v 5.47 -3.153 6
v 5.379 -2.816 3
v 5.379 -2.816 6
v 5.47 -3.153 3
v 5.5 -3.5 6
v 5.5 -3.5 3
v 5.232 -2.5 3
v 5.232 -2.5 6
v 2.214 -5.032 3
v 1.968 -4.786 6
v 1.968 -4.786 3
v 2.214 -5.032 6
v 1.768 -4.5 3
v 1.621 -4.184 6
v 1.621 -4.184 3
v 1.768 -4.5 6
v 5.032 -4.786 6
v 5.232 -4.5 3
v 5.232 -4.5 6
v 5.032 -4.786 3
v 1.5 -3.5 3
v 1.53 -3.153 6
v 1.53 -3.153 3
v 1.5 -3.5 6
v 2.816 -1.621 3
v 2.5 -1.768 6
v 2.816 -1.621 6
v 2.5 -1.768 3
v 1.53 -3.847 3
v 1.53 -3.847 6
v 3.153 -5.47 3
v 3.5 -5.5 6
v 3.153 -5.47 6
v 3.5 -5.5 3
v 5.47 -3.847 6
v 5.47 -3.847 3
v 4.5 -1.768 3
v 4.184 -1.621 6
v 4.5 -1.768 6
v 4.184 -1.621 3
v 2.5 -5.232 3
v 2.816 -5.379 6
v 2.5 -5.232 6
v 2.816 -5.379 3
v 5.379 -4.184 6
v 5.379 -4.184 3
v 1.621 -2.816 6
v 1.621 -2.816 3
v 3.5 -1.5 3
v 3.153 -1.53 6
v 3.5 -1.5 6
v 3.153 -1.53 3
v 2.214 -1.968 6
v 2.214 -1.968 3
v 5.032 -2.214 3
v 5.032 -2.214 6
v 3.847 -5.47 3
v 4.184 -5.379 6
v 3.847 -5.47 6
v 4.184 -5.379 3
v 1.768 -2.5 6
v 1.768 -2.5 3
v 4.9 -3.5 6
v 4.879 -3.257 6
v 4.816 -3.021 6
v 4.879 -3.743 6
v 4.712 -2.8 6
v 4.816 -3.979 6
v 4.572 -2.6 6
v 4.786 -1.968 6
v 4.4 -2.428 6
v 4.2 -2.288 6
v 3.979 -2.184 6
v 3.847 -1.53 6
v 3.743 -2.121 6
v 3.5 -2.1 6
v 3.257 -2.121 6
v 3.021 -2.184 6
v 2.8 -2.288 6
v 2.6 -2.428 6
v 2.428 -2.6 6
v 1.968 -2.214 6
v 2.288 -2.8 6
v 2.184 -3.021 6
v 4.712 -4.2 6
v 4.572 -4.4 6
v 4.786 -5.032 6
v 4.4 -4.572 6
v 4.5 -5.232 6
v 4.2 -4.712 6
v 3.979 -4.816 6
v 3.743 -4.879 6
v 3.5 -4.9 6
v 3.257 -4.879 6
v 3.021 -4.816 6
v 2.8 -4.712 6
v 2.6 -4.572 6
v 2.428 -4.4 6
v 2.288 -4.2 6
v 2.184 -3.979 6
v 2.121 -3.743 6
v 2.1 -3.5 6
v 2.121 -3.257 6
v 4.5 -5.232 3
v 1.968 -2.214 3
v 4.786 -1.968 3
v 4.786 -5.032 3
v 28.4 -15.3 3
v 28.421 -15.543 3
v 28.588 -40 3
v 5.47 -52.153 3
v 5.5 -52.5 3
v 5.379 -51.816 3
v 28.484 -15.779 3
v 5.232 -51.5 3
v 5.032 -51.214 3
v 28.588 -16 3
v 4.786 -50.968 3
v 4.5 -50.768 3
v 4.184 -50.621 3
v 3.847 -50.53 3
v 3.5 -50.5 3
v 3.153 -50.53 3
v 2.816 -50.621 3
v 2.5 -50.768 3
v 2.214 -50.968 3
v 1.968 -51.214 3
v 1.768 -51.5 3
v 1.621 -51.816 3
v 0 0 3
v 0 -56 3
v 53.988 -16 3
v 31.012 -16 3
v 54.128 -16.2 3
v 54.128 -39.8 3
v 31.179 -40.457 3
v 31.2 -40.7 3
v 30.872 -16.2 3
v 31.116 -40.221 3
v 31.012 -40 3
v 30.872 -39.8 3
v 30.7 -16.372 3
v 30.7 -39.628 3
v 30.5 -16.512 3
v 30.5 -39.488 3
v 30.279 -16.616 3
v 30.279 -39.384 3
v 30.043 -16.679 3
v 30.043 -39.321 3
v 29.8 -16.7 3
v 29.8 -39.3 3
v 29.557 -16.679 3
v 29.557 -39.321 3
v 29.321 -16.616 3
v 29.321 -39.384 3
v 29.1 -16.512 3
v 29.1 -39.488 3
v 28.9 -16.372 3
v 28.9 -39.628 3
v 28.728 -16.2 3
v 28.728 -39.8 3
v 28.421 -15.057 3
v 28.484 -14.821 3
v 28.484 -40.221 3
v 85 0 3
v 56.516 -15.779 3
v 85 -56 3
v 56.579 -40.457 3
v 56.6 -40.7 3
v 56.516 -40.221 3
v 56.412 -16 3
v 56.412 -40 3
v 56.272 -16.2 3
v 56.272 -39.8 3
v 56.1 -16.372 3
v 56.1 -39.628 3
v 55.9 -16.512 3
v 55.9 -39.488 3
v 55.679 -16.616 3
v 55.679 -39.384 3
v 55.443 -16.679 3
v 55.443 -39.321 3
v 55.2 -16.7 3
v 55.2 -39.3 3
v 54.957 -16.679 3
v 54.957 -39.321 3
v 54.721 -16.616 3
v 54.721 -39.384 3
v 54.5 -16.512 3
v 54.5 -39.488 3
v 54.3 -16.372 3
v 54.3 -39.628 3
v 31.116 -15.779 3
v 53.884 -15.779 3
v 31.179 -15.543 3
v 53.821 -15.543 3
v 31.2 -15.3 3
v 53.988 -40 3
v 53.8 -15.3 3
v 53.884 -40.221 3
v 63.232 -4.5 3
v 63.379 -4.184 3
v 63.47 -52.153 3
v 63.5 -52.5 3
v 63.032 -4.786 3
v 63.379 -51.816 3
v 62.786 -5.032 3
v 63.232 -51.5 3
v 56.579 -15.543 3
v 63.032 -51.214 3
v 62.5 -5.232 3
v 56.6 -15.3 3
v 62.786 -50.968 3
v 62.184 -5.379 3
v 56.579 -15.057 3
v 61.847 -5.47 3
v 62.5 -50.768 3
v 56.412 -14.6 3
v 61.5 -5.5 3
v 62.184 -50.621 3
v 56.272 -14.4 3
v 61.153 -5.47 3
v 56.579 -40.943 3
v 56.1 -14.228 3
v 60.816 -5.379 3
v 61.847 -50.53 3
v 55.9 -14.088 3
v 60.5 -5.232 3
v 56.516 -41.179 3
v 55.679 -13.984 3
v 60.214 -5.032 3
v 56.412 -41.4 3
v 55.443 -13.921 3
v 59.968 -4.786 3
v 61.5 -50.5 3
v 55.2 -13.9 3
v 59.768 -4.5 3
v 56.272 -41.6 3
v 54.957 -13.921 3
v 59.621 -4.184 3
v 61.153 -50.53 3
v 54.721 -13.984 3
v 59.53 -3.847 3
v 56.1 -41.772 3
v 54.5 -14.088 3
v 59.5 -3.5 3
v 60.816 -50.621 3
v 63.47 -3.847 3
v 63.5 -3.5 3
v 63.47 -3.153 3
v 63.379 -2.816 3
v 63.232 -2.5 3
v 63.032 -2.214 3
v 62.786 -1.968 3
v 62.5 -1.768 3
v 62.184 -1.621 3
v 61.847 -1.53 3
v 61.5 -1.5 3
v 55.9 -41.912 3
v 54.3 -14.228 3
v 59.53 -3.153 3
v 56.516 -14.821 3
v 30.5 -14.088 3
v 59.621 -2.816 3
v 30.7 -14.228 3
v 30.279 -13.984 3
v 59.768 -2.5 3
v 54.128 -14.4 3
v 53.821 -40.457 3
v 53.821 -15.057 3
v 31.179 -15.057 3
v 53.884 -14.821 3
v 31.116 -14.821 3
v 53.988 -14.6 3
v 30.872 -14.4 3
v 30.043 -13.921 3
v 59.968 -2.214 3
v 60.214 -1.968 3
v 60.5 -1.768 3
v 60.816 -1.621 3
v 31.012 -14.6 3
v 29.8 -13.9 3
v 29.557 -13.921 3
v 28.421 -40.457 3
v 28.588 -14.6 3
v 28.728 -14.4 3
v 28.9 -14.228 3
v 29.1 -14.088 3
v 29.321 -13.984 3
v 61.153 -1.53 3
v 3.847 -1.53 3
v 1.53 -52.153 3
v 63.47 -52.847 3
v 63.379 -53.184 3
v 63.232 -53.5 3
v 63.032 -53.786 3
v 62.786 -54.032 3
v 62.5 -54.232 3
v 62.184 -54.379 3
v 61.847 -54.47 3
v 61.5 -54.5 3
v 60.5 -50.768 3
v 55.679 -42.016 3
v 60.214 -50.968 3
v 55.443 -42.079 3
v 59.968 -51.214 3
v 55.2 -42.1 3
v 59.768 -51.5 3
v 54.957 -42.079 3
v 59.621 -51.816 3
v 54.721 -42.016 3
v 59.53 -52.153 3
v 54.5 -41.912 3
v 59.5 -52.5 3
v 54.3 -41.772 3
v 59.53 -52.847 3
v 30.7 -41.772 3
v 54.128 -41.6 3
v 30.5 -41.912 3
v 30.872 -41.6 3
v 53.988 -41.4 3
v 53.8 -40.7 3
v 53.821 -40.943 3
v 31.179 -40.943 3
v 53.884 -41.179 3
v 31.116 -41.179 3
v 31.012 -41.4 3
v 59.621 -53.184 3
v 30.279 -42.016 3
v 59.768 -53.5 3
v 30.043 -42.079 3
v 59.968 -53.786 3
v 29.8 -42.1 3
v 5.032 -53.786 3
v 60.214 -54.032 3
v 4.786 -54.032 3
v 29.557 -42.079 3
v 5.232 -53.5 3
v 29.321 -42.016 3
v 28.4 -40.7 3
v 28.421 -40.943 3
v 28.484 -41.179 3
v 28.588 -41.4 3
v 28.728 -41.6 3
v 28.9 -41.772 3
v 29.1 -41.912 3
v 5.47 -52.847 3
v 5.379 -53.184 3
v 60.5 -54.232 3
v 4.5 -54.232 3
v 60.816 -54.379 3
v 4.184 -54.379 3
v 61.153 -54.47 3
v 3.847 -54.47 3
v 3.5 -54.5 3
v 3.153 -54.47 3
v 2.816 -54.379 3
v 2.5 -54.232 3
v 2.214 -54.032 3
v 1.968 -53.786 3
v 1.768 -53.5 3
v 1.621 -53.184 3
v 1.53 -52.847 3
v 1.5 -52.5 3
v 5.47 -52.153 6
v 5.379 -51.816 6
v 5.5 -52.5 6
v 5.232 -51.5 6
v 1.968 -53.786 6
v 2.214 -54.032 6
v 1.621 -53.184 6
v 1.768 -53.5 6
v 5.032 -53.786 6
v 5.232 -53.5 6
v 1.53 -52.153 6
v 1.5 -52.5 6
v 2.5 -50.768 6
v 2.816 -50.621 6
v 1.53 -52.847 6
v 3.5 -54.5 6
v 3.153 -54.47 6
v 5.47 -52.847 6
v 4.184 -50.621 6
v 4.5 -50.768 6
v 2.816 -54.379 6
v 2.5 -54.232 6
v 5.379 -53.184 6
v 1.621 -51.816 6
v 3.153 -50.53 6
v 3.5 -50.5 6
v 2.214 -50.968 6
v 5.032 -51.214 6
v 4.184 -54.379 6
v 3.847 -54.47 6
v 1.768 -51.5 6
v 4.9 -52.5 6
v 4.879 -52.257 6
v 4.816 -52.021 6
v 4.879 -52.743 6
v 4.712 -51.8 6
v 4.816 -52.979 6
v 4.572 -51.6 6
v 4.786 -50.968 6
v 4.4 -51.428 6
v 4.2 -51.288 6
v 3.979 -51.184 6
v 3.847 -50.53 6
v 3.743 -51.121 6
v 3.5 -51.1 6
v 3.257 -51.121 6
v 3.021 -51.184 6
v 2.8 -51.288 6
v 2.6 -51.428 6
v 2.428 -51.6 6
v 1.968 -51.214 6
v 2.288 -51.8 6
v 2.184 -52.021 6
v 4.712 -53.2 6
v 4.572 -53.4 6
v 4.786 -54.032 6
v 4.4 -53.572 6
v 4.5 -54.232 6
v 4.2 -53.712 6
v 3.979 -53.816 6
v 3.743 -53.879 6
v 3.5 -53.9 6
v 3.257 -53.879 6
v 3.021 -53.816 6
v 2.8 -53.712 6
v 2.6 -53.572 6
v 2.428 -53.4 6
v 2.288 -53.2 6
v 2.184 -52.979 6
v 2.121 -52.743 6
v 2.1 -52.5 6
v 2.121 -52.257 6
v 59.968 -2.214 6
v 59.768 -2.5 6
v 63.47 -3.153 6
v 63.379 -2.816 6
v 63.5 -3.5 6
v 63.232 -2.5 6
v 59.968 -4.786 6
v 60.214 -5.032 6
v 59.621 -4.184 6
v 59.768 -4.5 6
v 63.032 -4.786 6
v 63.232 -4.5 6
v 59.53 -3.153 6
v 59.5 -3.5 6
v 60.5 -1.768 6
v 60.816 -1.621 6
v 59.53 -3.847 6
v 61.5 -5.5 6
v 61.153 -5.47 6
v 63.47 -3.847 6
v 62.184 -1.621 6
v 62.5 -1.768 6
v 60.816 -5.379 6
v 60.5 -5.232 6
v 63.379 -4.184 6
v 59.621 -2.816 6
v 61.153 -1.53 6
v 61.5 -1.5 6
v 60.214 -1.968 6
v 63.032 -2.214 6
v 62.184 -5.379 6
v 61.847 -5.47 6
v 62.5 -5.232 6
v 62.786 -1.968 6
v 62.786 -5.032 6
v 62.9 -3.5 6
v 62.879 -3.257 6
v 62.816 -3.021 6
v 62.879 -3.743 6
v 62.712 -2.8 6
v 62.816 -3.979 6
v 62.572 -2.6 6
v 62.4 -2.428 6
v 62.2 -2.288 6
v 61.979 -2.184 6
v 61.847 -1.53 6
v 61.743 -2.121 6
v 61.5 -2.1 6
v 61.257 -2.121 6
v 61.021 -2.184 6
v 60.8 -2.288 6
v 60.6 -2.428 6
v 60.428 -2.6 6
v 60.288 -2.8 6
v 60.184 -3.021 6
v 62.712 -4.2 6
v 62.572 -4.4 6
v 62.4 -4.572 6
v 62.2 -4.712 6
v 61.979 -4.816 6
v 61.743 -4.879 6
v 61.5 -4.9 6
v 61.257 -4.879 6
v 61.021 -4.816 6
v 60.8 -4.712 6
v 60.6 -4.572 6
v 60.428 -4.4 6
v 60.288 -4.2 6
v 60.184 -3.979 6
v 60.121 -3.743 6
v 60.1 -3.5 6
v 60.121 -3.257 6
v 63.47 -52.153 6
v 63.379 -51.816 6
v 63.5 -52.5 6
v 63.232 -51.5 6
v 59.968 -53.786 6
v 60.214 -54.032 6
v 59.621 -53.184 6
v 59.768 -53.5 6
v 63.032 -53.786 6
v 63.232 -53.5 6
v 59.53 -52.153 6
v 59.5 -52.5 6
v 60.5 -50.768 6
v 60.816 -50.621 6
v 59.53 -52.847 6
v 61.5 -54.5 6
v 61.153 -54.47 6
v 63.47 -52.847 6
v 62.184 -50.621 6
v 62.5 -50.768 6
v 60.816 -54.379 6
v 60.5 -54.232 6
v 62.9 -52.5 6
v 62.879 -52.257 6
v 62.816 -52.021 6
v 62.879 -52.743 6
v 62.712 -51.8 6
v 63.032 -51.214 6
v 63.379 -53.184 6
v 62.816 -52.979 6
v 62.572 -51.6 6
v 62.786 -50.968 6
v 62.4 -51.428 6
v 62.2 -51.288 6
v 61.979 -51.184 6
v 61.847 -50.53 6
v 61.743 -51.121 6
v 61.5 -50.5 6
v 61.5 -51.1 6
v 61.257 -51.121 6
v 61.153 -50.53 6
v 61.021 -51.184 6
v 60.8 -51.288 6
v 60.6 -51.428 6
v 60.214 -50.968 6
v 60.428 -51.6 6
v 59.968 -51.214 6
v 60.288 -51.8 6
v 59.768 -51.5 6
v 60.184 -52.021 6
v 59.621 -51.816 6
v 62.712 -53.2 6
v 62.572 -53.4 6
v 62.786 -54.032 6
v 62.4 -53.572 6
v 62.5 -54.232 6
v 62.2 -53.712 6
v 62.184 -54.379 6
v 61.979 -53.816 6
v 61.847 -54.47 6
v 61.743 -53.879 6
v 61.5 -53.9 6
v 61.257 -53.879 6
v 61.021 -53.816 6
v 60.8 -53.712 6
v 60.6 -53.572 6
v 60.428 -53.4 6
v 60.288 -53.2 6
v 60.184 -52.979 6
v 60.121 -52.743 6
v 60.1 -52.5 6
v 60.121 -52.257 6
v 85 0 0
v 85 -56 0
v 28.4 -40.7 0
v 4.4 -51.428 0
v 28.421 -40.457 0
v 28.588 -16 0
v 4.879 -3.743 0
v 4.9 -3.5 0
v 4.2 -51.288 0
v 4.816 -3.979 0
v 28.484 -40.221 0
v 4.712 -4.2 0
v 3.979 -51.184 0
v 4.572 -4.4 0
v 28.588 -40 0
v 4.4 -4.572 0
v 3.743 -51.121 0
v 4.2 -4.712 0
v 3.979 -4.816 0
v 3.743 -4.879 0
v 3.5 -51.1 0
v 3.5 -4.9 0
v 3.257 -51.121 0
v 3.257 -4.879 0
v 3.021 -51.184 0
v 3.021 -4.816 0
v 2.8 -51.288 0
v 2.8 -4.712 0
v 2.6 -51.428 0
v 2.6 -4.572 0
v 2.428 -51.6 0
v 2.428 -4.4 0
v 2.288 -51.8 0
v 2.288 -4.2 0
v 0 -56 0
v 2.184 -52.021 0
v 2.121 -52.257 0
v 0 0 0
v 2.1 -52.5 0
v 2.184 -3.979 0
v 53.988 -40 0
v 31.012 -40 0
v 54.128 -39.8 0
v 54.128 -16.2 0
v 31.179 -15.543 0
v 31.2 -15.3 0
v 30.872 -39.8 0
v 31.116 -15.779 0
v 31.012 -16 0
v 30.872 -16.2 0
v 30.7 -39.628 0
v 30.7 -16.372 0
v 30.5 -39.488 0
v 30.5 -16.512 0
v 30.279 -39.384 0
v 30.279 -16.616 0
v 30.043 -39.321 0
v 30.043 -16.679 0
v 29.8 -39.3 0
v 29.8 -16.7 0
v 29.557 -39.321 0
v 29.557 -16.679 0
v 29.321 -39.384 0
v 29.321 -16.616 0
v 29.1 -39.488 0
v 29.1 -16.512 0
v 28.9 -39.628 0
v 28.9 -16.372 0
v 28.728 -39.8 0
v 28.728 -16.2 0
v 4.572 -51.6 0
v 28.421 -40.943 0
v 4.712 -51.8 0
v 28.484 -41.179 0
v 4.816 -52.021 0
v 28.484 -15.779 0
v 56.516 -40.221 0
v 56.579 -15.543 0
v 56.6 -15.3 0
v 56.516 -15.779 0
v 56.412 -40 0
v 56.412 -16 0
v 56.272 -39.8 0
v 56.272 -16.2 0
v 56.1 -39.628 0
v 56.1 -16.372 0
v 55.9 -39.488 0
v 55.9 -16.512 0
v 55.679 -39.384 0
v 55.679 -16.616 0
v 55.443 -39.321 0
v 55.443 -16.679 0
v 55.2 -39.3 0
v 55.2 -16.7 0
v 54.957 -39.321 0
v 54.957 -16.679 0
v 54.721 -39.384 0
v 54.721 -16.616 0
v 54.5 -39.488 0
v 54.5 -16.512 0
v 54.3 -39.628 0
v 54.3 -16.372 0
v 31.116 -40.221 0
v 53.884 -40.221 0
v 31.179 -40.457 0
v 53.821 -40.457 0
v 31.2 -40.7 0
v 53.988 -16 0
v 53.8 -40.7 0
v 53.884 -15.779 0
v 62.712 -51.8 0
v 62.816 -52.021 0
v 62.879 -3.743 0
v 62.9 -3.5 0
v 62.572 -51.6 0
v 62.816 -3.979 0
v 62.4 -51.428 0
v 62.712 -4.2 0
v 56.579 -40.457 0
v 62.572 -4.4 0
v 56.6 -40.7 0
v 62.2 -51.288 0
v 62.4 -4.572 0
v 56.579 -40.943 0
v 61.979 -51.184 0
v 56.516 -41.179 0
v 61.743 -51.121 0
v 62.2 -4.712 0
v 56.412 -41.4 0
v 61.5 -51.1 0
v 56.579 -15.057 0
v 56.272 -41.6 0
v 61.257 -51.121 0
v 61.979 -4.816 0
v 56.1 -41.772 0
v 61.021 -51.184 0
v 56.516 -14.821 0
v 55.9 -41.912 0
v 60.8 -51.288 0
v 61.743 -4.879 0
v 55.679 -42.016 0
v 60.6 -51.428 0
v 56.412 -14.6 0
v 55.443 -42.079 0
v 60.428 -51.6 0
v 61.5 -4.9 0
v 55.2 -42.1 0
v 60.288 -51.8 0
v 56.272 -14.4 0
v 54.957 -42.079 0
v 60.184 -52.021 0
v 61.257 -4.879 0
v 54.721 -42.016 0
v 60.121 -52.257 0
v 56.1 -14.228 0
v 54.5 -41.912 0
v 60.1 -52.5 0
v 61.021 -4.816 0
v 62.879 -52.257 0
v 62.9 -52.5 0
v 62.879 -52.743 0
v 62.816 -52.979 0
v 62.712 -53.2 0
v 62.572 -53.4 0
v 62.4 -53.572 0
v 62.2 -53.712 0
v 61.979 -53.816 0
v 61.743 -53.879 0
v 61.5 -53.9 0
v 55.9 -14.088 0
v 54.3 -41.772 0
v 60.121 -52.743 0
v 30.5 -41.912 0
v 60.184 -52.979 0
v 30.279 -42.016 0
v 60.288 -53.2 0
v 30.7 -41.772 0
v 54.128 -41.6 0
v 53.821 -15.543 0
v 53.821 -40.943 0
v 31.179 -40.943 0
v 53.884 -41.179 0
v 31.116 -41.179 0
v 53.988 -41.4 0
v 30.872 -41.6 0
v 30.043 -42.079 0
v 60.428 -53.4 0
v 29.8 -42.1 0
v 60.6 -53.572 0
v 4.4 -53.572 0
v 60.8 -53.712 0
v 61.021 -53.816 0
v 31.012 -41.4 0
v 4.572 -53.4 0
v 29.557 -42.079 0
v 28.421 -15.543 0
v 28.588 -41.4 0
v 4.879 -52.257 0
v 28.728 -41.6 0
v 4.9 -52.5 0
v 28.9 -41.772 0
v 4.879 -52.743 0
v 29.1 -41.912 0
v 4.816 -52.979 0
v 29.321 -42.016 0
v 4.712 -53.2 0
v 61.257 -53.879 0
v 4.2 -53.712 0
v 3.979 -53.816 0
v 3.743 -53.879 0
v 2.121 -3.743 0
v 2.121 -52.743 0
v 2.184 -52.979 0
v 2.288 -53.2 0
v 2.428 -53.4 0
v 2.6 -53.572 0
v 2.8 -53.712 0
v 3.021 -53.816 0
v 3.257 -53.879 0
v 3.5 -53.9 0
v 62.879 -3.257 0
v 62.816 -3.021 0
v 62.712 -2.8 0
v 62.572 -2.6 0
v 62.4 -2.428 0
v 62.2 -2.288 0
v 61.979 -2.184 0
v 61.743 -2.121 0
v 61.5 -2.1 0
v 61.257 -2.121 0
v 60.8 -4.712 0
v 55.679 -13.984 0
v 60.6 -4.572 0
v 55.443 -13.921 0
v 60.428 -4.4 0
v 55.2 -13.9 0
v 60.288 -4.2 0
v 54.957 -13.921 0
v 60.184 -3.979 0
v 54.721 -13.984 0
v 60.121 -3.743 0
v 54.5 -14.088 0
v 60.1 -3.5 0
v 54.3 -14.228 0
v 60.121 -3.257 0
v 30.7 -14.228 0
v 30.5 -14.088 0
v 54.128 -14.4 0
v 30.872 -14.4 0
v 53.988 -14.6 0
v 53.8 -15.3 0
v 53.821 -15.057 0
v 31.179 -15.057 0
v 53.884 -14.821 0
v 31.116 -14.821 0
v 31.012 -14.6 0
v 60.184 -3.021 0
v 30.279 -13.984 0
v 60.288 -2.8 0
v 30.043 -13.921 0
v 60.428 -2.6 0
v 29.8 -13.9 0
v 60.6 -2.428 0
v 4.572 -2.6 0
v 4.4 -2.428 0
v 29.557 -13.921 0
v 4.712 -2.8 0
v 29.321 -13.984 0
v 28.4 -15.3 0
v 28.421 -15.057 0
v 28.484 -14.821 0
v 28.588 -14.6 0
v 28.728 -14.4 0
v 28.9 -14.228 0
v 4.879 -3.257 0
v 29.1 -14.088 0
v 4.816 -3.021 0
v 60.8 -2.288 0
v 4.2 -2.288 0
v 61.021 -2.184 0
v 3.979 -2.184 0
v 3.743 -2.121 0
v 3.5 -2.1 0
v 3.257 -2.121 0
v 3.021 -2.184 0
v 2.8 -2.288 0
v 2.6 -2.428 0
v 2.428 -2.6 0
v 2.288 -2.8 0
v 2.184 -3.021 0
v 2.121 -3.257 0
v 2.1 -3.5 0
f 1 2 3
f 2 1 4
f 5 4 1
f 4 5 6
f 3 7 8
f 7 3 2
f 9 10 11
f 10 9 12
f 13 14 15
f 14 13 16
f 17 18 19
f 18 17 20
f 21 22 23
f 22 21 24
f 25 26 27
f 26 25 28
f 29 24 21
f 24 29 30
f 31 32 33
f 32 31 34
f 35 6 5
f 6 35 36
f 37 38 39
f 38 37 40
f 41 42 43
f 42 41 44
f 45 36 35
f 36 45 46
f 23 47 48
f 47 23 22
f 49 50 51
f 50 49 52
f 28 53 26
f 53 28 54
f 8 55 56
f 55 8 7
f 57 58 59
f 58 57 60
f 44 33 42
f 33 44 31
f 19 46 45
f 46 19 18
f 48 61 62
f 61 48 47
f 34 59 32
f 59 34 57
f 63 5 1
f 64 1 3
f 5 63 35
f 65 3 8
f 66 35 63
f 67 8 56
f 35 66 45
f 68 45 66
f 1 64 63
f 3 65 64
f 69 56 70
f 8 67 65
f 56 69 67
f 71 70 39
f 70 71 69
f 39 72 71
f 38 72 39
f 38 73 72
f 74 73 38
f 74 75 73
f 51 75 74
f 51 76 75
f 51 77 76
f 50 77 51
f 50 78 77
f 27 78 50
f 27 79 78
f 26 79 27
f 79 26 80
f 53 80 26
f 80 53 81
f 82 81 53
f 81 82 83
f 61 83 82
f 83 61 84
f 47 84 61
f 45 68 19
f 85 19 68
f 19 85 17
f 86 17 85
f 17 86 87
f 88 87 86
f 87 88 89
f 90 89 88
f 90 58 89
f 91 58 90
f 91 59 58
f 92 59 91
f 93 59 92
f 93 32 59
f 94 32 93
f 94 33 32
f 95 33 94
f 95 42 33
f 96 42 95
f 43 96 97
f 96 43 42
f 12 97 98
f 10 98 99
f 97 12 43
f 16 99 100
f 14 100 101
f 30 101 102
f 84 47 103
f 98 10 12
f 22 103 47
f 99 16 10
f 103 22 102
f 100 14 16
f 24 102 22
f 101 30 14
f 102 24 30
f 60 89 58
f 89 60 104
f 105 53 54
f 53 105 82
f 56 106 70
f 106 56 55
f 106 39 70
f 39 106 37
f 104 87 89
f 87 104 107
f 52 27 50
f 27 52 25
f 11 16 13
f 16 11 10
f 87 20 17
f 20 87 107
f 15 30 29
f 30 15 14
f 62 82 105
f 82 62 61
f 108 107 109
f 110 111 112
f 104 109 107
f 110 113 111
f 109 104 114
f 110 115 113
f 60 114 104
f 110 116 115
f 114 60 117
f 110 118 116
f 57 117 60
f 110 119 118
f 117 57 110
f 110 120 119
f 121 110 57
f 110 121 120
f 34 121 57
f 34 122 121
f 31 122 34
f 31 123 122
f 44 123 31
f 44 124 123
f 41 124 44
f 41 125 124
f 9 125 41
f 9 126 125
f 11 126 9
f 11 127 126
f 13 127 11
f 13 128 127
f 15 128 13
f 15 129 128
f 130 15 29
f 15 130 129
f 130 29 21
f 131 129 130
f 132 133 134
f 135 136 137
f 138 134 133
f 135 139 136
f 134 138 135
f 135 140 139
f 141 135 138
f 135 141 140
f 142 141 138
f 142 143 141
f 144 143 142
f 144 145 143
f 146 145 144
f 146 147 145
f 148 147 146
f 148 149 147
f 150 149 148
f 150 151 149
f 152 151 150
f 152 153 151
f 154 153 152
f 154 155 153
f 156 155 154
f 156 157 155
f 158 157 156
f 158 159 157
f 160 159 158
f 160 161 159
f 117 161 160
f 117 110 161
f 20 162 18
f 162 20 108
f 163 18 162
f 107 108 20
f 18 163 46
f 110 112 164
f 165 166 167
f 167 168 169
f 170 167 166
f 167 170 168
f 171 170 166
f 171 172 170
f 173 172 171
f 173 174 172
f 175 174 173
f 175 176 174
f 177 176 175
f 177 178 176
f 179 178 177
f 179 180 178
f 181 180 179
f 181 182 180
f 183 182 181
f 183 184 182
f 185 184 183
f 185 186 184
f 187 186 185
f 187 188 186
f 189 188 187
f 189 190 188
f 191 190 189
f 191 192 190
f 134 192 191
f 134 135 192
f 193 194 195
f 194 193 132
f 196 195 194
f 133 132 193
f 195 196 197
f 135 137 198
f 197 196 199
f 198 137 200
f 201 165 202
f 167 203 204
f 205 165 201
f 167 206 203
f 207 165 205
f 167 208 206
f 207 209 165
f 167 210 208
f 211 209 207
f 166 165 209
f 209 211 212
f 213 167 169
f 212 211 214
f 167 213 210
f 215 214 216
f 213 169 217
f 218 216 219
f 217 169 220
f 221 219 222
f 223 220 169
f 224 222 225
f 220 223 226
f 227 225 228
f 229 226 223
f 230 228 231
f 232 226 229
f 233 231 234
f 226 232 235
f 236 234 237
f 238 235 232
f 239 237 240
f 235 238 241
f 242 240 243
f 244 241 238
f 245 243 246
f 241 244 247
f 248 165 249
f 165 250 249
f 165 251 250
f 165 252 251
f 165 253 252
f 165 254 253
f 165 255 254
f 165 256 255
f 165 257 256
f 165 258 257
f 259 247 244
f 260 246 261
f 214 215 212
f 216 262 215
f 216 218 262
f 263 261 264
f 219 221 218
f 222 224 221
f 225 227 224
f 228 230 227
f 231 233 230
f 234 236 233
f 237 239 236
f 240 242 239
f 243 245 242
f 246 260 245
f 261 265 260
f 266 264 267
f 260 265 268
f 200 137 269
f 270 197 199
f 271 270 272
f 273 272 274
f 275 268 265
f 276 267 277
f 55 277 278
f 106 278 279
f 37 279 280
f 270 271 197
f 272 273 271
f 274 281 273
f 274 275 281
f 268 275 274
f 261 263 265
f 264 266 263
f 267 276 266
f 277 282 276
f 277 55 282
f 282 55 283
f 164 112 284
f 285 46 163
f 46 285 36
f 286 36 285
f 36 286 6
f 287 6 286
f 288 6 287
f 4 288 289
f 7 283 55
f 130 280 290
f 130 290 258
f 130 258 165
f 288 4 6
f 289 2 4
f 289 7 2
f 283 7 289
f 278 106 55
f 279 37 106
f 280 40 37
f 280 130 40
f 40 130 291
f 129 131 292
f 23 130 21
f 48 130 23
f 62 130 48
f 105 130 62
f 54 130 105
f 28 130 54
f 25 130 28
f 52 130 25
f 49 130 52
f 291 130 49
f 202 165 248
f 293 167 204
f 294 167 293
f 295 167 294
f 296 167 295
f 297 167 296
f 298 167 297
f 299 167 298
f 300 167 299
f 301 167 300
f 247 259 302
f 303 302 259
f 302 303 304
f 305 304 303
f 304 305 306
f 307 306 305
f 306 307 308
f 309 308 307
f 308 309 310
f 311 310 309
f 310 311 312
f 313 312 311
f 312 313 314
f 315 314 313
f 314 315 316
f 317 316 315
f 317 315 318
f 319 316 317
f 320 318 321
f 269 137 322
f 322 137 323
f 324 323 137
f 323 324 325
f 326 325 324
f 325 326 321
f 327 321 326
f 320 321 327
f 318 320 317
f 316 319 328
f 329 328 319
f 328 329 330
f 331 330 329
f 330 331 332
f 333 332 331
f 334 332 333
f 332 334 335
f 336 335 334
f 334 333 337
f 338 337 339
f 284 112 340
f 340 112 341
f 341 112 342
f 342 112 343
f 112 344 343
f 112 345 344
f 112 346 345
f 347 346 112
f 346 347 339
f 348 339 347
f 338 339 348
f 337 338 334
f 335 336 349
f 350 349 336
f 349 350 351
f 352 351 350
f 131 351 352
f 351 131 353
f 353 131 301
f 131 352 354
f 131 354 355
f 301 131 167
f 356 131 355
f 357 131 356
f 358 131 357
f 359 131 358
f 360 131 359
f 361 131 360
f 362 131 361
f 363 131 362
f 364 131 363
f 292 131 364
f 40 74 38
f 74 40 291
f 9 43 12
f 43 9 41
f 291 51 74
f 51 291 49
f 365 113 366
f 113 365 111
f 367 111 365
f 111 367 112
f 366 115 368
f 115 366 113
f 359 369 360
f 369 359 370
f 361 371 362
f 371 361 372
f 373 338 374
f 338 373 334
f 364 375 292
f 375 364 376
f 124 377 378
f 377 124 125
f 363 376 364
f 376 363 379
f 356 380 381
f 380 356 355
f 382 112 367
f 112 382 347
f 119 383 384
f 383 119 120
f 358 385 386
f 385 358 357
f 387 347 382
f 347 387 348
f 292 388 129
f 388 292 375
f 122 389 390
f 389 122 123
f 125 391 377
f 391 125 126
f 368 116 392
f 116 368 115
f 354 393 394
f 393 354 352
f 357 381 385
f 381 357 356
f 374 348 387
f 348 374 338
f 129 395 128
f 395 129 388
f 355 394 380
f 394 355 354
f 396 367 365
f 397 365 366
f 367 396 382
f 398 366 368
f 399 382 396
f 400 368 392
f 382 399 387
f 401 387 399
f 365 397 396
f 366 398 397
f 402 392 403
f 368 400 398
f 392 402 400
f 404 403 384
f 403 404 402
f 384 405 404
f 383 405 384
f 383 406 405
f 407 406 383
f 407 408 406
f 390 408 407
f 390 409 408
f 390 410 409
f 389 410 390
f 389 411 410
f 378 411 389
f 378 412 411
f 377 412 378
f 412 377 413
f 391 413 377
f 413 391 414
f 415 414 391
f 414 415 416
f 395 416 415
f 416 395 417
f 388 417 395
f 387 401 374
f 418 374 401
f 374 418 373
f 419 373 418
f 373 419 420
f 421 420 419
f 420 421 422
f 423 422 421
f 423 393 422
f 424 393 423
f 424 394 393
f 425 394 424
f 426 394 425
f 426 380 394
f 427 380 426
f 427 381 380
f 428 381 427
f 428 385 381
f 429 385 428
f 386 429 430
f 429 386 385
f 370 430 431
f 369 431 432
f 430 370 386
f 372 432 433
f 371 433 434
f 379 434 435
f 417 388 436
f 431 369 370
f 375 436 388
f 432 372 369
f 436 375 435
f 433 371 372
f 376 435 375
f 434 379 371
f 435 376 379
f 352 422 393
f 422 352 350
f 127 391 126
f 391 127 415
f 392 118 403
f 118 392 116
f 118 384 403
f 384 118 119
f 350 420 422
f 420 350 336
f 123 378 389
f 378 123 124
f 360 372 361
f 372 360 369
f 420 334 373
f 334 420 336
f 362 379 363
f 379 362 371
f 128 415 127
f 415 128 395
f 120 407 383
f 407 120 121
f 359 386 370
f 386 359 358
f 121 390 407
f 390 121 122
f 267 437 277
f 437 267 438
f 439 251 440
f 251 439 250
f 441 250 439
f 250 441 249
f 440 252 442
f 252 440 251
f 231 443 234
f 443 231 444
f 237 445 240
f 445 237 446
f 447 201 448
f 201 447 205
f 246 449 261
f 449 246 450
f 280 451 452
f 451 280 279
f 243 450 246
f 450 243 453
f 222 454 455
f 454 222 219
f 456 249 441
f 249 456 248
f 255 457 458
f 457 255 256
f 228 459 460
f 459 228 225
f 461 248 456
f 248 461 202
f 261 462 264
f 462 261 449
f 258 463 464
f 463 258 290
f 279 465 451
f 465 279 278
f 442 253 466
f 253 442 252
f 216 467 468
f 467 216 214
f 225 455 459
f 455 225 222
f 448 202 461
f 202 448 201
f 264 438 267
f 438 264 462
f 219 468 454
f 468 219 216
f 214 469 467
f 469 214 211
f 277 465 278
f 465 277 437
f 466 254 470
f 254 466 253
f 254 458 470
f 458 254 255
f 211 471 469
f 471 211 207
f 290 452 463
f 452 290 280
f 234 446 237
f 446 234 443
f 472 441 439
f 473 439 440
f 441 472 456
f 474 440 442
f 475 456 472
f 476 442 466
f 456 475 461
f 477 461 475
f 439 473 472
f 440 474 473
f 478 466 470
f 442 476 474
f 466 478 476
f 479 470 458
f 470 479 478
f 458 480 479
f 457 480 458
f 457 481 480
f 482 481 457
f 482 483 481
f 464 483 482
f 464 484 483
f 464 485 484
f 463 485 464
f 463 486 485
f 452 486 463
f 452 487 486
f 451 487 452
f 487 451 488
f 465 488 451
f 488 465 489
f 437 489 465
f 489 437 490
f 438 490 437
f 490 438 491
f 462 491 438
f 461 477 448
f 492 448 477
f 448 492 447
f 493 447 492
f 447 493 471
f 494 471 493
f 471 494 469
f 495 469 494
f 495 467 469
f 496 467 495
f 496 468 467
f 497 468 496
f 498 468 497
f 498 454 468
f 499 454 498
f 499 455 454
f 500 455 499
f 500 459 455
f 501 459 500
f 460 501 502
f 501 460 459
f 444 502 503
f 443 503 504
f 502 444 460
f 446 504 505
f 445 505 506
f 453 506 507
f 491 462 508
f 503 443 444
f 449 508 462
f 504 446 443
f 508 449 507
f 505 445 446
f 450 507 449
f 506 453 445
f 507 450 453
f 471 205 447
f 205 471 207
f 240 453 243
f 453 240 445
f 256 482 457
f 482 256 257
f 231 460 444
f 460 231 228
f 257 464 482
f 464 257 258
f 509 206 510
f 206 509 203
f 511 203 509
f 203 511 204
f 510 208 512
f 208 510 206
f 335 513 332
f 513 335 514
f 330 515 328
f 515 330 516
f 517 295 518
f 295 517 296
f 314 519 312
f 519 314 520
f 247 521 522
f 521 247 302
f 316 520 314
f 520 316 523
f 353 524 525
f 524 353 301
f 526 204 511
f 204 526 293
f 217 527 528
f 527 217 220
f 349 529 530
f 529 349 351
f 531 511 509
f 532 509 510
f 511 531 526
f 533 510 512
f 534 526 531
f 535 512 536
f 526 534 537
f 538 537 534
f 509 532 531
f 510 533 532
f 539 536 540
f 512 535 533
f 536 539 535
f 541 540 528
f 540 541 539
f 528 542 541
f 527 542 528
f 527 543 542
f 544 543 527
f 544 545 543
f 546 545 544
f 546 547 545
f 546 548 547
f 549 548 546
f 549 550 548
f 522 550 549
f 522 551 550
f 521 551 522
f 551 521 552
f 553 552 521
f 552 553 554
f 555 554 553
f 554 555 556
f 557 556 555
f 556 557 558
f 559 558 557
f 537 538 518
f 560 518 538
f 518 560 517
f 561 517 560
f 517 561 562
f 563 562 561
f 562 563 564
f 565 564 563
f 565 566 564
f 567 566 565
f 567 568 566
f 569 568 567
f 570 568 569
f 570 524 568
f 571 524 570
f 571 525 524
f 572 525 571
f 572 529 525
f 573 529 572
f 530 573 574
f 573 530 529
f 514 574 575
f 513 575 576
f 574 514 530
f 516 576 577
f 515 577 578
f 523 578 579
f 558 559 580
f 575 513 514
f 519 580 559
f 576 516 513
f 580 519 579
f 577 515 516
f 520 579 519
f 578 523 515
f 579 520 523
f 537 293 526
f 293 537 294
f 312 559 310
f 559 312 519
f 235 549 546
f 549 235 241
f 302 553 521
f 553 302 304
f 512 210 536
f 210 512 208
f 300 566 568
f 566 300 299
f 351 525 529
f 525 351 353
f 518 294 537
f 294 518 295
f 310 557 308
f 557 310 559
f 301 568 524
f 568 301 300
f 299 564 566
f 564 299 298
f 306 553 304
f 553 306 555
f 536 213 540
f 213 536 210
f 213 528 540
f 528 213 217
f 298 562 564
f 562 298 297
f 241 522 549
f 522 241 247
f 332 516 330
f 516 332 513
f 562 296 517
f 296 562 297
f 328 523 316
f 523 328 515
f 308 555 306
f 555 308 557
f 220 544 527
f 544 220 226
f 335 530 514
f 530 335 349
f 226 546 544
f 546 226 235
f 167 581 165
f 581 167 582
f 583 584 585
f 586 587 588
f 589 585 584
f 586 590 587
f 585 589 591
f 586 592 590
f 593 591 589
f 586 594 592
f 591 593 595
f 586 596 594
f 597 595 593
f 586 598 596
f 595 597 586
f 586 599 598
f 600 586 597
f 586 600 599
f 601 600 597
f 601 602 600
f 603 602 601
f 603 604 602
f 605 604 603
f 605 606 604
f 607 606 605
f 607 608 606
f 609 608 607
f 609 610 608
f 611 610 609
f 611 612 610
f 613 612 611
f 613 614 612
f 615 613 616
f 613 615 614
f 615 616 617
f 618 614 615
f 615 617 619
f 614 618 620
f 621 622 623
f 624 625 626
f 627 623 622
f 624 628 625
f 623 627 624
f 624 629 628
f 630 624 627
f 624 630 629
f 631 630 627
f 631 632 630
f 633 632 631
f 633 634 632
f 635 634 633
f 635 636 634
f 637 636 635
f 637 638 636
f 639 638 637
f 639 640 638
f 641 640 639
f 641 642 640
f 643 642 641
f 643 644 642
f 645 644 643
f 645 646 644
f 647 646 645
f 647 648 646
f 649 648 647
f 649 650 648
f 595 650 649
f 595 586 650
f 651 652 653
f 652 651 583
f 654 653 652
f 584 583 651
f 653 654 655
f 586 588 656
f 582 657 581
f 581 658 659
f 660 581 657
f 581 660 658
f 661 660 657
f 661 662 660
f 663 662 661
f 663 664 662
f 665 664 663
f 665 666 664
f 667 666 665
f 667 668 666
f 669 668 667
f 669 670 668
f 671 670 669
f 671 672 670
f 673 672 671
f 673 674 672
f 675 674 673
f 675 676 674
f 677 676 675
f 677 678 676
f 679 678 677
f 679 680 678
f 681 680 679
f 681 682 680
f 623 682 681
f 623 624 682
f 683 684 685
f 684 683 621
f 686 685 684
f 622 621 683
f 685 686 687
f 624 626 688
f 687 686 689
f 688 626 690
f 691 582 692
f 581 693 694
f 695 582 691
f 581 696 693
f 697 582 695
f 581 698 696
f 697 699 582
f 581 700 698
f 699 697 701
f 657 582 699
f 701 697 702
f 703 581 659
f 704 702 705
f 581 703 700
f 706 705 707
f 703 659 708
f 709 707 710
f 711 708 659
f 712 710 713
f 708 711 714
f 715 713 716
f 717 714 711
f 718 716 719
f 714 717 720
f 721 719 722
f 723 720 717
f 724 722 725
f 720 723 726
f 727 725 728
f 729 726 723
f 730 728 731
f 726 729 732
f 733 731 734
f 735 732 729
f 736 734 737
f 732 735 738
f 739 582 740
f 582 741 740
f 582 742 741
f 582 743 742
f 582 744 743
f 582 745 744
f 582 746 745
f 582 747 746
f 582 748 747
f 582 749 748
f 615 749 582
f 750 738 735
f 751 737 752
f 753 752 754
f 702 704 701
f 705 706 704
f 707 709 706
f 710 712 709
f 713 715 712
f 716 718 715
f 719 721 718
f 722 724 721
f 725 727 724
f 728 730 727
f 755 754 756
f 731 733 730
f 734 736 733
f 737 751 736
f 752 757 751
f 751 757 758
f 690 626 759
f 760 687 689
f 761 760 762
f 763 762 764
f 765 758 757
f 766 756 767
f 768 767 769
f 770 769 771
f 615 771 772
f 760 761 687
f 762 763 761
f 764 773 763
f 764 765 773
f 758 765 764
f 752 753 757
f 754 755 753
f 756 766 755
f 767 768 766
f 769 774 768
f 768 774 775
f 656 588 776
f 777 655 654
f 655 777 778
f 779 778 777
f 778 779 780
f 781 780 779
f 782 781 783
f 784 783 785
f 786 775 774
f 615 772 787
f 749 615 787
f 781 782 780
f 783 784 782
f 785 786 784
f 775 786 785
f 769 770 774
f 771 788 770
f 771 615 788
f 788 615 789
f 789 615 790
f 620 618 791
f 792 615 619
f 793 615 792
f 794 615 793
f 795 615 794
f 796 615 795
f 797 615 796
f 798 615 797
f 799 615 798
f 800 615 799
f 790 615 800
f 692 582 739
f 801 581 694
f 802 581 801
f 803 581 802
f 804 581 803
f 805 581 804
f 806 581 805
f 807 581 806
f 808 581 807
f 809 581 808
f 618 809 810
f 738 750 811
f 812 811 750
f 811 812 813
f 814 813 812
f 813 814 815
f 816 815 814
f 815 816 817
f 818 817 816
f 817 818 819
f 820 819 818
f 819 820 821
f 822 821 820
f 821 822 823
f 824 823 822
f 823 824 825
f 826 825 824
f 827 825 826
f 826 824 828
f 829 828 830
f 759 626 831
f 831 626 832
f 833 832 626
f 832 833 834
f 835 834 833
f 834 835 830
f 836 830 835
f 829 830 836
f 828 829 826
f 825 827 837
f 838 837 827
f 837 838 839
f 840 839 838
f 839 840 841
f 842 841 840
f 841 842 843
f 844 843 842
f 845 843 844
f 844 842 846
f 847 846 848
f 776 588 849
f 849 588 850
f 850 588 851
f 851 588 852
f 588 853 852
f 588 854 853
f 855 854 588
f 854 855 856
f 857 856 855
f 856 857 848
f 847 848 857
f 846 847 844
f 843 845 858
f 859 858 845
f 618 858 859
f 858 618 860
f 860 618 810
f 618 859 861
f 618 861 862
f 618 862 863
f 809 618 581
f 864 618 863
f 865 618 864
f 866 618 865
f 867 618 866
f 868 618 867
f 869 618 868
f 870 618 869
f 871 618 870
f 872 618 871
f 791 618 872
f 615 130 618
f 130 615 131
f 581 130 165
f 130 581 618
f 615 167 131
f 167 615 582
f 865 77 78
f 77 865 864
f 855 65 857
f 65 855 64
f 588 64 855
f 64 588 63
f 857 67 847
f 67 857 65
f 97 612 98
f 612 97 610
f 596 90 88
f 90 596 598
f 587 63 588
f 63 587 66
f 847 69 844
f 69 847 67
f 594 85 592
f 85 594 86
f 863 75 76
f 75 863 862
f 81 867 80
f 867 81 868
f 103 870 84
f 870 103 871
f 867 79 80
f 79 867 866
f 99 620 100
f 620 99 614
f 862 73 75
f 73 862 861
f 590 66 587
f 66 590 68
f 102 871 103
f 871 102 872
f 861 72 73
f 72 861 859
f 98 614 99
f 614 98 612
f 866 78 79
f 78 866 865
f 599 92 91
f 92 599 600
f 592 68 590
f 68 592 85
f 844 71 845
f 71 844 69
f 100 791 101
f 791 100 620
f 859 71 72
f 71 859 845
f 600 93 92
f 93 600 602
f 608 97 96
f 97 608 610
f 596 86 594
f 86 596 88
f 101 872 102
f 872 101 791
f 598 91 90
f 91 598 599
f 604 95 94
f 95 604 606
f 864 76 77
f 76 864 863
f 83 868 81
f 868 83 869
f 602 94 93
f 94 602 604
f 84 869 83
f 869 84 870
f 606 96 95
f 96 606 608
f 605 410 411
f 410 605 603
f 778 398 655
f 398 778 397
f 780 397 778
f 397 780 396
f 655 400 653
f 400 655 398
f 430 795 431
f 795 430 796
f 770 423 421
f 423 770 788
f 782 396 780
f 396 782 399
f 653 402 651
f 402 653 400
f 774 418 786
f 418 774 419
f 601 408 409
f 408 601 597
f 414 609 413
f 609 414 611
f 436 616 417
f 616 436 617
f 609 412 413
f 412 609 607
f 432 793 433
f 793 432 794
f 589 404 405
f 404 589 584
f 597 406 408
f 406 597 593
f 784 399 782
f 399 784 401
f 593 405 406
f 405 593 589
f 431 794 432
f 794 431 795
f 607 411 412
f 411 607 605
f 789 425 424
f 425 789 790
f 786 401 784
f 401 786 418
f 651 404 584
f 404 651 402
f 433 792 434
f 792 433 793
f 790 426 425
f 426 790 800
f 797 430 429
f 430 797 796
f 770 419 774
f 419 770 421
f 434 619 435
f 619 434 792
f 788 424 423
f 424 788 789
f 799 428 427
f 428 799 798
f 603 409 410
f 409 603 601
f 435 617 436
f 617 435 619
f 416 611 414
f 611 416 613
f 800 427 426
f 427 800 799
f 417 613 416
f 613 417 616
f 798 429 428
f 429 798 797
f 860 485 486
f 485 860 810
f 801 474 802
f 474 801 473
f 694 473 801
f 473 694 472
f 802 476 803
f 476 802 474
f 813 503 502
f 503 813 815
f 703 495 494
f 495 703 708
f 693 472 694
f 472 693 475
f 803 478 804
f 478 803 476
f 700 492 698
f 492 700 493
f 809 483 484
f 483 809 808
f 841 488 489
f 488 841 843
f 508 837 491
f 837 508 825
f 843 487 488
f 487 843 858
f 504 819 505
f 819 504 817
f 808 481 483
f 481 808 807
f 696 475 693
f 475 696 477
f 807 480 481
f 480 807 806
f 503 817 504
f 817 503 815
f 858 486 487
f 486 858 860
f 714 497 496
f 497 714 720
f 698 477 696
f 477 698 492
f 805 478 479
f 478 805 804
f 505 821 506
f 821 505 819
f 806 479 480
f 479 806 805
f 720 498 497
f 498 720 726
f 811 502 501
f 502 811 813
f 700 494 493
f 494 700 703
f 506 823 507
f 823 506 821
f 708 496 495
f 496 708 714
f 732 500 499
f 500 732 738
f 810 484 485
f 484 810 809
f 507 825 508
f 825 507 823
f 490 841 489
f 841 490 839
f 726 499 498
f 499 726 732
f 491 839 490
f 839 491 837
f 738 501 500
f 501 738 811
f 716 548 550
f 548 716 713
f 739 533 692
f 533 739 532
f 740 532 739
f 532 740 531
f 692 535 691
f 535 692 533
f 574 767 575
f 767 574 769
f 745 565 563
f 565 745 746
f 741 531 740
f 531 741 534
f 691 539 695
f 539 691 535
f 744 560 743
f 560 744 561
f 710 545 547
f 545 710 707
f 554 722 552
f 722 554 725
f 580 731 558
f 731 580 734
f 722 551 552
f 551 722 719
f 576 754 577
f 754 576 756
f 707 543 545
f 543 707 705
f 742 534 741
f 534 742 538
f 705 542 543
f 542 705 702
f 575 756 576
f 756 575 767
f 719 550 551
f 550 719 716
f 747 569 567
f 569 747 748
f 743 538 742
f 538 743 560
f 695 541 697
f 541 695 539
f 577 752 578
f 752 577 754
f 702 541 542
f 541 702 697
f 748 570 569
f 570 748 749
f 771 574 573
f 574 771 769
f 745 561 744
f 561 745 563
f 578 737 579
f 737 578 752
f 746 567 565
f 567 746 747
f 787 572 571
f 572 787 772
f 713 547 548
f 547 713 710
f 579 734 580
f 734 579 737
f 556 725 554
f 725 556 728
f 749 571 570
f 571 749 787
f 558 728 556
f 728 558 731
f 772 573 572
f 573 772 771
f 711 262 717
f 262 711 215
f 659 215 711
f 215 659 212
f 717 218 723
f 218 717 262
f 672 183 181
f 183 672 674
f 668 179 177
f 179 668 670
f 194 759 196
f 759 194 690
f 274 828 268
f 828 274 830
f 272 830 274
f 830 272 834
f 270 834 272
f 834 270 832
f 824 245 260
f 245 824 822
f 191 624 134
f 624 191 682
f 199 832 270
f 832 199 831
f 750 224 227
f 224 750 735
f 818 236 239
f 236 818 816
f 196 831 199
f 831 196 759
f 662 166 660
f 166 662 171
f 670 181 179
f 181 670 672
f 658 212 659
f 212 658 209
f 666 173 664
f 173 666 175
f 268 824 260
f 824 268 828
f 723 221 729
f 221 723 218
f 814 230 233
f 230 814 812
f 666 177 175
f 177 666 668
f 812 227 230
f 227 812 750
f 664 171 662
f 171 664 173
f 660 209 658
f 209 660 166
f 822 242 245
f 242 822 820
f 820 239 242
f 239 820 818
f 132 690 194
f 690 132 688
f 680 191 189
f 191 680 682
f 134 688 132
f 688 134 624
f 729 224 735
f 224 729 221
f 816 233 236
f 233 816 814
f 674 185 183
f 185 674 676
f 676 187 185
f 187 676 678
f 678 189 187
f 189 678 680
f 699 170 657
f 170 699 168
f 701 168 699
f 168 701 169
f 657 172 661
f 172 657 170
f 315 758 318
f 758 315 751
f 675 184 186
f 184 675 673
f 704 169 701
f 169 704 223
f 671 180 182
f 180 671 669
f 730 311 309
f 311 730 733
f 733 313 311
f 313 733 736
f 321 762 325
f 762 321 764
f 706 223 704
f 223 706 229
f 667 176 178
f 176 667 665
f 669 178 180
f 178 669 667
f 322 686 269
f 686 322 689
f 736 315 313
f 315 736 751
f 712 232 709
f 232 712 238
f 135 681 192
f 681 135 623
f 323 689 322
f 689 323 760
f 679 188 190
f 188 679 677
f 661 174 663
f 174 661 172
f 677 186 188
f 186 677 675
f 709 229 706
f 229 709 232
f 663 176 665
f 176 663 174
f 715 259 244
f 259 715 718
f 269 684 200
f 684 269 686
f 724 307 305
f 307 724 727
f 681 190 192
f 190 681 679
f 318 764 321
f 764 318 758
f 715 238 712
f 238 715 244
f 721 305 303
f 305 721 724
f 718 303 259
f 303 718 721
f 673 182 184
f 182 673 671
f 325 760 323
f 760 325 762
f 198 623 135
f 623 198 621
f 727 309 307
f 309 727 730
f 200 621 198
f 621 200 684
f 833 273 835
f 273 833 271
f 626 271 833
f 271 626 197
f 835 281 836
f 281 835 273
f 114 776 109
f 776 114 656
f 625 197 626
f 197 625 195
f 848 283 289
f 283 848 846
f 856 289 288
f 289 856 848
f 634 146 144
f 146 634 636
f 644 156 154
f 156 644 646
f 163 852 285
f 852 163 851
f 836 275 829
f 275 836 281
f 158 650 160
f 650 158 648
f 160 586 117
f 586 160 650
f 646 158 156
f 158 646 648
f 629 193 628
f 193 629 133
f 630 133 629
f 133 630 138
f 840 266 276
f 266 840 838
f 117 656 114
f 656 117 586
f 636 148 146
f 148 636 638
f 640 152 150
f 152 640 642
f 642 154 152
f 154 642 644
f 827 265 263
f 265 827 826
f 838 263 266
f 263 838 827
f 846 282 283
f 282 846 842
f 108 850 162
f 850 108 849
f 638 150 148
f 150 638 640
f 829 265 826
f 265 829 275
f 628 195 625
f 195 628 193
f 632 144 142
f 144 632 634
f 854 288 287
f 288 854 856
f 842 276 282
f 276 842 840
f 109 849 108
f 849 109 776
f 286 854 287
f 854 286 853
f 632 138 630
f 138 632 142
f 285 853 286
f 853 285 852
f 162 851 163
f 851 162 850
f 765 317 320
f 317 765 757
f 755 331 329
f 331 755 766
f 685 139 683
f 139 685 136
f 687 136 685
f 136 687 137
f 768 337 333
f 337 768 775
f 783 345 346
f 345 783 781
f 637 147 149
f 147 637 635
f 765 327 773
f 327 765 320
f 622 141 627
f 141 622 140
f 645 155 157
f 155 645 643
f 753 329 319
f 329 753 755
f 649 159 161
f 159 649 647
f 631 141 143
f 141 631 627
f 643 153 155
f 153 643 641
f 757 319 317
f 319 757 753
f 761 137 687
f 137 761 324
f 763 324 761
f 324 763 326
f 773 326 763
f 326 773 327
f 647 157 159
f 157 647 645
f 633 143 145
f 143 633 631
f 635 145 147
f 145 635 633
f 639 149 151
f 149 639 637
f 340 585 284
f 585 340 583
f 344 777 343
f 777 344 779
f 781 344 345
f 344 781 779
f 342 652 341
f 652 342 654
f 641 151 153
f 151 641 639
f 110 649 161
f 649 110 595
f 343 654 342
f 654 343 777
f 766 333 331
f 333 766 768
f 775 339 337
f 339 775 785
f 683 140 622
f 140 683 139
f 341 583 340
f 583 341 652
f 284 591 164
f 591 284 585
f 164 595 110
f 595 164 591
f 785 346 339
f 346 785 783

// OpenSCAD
//
// Raspberry Pi 3B+
//
// RaspberryPi3Bplus-1-20250515D.scad
//
// https://www.raspberrypi.com/documentation/computers/raspberry-pi.html
//
// Last update: 2025-05-16(Fri) 05:41 JST / 2025-05-15(Thu) 20:41 UTC
// Last update: 2025-05-25(Sun) 08:08 JST / 2025-05-24(Sat) 23:08 UTC
//

Px = 85.0; Py = -56.0; Pz = 3.0;    // パネルの 横・縦・厚さ （P は "Panel" の P）
Cd = 4.0;  Cz = 3.0;                // 円柱の直径、厚さ （Cは "Cylinder" の C）
H1d = 2.8; H2d = 2.8;               // 穴1,穴2の直径 （H は "Hole" の H）

// 穴1の位置リスト
hole1_pos = [
    [ 3.5,   -3.5 ],
    [ 3.5,  -52.5 ],
    [ 61.5,  -3.5 ],
    [ 61.5, -52.5 ]
];

// 穴2の位置リスト
hole2_pos = [
  [ Px/2 + 12.7, Py/2 + 12.7 ],
  [ Px/2 + 12.7, Py/2 - 12.7 ],
  [ Px/2 - 12.7, Py/2 + 12.7 ],
  [ Px/2 - 12.7, Py/2 - 12.7 ],
];

difference() {
    // (1) まず、4本の円柱を持つ直方体のパネルを作る
    union() {
        // パネルを用意
        // cube([Px, -Py, Pz]); // 第1章限で造形する場合
        translate([0, Py, 0]) cube([Px, -Py, Pz]);  // 第4象限で造形する場合
        // 円柱を4本立てる
        for (pos = hole1_pos) {
            x = pos[0]; y = pos[1];
            translate([x, y, Pz]) cylinder(h = Cz, d = Cd, $fn = 36);
        }
    }
    // (2) 次に、それぞれの円柱に穴1を貫通させる
    for (pos = hole1_pos) {
        x = pos[0]; y = pos[1];
        translate([x, y, -1.0]) cylinder(h = Pz + Cz + 2.0, d = H1d, $fn = 36);
        // 確実に穴をあけるため、パネル厚+円柱厚より2mm長い円柱をパネル底面より1mm沈めて配置
    }
    // (3) 最後に、パネルに穴2を貫通させる
    for (pos = hole2_pos) {
        x = pos[0]; y = pos[1];
        translate([x, y, -1.0]) cylinder(h = Pz + 2.0, d = H2d, $fn = 36);
        // 確実に穴をあけるため、パネル厚+円柱厚より2mm長い円柱をパネル底面より1mm沈めて配置
    }
}
